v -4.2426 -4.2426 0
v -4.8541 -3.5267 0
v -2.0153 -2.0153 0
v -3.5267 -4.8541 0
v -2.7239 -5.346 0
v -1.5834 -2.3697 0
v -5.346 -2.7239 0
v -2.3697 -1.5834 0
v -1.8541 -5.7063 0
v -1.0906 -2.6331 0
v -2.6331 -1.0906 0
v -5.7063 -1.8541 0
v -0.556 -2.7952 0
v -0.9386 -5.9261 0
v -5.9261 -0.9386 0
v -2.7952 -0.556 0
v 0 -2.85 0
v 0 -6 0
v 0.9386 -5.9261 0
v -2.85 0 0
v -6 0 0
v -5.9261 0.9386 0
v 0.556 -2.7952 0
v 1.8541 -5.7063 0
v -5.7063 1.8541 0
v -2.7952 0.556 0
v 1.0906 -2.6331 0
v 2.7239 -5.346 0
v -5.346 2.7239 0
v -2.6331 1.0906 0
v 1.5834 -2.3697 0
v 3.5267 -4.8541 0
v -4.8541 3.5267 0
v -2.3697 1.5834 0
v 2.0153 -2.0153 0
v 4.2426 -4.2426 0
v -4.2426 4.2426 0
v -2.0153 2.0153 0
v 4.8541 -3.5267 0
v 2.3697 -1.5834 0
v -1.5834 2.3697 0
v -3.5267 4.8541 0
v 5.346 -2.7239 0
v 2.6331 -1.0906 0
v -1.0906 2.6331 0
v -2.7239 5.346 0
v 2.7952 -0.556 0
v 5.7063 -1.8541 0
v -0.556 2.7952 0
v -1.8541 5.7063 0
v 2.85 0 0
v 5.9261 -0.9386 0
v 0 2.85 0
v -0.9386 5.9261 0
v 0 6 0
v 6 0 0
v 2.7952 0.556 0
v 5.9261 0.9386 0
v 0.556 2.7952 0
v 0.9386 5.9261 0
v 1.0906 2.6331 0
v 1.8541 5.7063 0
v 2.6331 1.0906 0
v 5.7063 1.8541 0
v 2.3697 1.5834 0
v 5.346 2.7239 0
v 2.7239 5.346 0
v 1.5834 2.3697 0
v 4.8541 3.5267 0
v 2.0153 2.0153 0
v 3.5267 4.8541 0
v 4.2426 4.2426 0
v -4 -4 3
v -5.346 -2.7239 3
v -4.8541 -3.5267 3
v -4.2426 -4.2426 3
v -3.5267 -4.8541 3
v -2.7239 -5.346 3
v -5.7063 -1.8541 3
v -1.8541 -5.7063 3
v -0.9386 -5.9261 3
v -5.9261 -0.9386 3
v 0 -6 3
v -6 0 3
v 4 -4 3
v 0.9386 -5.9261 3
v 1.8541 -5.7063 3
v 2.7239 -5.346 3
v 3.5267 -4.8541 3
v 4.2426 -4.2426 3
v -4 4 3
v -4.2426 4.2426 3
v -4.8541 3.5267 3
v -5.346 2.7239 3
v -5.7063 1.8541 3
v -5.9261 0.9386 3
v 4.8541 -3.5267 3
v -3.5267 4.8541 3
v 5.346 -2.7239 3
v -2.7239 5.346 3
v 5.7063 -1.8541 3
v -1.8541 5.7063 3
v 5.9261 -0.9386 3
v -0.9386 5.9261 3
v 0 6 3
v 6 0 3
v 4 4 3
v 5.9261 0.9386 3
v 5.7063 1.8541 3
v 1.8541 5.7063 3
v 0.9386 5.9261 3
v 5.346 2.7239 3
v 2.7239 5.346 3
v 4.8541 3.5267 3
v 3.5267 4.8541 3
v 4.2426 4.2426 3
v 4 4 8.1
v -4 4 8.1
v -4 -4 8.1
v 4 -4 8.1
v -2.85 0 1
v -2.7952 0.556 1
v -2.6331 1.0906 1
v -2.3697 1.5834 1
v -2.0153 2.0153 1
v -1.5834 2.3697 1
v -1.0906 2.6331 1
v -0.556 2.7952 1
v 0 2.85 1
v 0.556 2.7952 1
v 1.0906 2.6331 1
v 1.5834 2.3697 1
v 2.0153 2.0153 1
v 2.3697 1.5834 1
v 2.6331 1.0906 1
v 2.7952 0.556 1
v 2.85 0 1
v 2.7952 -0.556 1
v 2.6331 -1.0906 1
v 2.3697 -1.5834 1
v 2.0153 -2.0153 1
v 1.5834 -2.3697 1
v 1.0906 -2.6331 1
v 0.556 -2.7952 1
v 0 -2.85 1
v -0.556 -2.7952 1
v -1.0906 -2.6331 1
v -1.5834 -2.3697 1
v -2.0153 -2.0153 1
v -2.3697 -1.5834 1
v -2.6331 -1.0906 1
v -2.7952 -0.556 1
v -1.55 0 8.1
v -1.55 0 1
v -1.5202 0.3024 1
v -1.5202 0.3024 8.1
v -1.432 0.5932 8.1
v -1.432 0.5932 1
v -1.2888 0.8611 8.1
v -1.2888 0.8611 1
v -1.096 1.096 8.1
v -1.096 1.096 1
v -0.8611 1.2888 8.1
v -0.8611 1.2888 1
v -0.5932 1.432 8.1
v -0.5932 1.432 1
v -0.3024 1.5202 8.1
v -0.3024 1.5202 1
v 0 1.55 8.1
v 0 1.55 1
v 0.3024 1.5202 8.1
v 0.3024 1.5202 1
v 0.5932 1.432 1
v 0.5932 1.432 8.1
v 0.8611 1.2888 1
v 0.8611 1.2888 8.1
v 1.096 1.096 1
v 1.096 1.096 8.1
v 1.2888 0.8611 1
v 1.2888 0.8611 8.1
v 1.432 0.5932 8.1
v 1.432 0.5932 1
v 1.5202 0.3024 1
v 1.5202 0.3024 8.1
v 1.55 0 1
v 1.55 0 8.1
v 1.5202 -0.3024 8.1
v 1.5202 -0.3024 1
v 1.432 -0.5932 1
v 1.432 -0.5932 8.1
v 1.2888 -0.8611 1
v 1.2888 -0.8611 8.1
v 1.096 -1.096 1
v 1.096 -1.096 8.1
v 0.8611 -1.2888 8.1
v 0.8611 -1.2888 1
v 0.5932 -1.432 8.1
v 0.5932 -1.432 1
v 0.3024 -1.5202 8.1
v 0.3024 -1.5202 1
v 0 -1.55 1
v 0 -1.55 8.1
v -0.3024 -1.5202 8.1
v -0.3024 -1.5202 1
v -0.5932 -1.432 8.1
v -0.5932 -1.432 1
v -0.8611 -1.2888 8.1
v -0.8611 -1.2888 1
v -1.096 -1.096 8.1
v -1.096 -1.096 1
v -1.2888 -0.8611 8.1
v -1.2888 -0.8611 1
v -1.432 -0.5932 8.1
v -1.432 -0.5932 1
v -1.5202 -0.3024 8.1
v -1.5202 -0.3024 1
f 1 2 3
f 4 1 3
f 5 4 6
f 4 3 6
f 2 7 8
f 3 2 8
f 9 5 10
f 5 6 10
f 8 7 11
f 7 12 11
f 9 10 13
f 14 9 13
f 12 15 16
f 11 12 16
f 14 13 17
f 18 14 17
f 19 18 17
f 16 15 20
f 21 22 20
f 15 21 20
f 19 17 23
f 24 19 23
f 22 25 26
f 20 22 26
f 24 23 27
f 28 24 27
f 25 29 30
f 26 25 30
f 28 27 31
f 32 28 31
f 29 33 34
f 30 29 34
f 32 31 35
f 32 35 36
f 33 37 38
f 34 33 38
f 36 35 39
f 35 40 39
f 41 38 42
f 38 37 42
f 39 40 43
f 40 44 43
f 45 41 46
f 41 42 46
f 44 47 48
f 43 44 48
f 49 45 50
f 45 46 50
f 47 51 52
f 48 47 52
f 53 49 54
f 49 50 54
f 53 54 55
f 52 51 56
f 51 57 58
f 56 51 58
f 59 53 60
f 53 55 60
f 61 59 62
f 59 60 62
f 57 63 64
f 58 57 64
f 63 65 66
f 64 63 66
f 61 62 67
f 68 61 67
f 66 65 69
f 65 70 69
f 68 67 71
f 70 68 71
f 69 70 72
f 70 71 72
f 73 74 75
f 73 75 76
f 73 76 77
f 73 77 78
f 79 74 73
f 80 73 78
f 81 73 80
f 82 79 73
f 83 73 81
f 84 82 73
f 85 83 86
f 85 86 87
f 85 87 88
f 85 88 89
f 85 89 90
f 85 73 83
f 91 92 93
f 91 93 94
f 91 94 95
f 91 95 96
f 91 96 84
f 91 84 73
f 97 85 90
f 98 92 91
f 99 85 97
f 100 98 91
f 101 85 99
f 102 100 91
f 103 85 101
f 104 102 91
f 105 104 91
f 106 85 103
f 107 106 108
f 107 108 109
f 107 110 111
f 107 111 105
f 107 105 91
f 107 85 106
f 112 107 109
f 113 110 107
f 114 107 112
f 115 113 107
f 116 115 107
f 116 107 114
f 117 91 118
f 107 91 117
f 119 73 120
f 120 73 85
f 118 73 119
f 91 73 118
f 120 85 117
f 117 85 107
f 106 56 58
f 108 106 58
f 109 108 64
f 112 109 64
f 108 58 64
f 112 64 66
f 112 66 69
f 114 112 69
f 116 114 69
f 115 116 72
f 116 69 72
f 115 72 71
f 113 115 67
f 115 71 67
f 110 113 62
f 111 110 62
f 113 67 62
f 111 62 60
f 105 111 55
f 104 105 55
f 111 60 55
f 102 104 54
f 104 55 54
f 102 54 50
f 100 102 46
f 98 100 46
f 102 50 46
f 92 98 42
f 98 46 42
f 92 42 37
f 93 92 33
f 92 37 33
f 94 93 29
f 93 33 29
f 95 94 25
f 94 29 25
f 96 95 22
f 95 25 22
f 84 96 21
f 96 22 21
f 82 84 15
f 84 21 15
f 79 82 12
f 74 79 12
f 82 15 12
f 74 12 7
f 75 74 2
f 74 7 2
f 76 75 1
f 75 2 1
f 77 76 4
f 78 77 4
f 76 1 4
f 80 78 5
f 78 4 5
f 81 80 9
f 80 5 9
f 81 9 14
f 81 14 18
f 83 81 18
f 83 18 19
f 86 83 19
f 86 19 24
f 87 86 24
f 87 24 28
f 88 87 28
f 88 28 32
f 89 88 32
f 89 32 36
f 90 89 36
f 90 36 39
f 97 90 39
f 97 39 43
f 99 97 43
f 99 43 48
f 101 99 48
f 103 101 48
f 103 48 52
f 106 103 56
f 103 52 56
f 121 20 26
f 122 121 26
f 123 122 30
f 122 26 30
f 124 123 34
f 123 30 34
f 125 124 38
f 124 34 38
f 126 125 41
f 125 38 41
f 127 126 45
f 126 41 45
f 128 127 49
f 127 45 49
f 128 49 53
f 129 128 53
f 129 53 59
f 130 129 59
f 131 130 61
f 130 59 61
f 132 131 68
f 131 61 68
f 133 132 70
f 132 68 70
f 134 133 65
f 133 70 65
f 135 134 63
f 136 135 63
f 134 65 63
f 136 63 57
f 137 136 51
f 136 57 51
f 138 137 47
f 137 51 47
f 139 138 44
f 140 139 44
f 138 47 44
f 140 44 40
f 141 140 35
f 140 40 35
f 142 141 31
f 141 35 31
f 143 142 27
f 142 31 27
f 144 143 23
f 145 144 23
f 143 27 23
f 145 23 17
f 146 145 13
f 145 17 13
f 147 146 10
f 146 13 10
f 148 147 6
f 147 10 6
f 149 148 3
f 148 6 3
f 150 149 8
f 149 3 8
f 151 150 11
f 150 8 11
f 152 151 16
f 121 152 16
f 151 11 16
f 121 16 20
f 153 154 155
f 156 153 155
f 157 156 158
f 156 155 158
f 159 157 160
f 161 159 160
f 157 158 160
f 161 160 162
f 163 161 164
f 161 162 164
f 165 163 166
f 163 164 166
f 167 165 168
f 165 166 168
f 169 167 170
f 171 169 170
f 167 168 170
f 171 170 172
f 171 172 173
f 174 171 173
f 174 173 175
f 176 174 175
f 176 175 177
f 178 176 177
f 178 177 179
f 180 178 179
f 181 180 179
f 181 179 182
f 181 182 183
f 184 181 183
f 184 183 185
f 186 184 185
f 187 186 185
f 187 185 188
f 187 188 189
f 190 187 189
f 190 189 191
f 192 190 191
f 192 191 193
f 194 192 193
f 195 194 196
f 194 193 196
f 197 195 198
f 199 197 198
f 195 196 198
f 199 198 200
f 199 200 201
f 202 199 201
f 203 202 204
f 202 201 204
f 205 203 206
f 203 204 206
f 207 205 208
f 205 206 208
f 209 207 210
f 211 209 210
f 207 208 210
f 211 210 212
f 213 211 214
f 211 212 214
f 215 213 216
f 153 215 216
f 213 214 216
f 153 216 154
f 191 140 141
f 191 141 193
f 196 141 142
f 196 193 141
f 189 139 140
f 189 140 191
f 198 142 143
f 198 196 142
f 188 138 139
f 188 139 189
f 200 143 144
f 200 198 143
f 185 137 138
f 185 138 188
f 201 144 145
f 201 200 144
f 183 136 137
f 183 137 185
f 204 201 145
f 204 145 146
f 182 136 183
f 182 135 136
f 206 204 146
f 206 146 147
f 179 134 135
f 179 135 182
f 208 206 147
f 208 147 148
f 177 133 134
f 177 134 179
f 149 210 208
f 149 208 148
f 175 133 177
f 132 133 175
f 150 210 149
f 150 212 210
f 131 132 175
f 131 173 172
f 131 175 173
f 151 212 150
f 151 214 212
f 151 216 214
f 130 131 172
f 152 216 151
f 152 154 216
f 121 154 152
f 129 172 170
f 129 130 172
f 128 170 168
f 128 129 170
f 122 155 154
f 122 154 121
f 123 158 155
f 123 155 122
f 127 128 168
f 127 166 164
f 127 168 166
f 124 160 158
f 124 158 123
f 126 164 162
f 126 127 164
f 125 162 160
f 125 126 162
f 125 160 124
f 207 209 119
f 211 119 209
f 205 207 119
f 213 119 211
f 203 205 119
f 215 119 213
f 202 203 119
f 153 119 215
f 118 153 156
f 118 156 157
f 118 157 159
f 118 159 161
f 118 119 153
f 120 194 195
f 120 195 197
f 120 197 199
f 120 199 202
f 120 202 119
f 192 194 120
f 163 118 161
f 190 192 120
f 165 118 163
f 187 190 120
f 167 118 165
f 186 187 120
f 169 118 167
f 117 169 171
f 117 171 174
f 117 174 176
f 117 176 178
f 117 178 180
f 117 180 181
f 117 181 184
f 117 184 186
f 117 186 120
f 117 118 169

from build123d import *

# Parameters (mm, degrees)
SKETCH_1_R          = 6
EXTRUDE_1_DEPTH     = 3
SKETCH_2_W          = 8
SKETCH_2_H          = 8
EXTRUDE_2_DEPTH     = 5.1
SKETCH_4_R          = 2.85
CUT_EXTRUDE_1_DEPTH = 1
SKETCH_5_R          = 1.55
CUT_EXTRUDE_2_DEPTH = 8.1


with BuildPart() as part:
    # 草图1 → 凸台-拉伸1 (new body)
    with BuildSketch(Plane.XY):
        Circle(SKETCH_1_R)
    extrude(amount=EXTRUDE_1_DEPTH)

    # 草图2 → 凸台-拉伸2 (add)
    with BuildSketch(Plane.XY.offset(3)):
        Rectangle(SKETCH_2_W, SKETCH_2_H)
    extrude(amount=EXTRUDE_2_DEPTH)

    # 草图4 → 切除-拉伸1 (cut)
    with BuildSketch(Plane(origin=(0, 0, 0), x_dir=(-1, 0, 0), z_dir=(0, 0, -1))):
        Circle(SKETCH_4_R)
    extrude(amount=-CUT_EXTRUDE_1_DEPTH, mode=Mode.SUBTRACT)

    # 草图5 → 切除-拉伸2 (cut, through all)
    with BuildSketch(Plane(origin=(0, 0, 1), x_dir=(-1, 0, 0), z_dir=(0, 0, -1))):
        Circle(SKETCH_5_R)
    extrude(amount=-CUT_EXTRUDE_2_DEPTH, mode=Mode.SUBTRACT)


solid = part.part
